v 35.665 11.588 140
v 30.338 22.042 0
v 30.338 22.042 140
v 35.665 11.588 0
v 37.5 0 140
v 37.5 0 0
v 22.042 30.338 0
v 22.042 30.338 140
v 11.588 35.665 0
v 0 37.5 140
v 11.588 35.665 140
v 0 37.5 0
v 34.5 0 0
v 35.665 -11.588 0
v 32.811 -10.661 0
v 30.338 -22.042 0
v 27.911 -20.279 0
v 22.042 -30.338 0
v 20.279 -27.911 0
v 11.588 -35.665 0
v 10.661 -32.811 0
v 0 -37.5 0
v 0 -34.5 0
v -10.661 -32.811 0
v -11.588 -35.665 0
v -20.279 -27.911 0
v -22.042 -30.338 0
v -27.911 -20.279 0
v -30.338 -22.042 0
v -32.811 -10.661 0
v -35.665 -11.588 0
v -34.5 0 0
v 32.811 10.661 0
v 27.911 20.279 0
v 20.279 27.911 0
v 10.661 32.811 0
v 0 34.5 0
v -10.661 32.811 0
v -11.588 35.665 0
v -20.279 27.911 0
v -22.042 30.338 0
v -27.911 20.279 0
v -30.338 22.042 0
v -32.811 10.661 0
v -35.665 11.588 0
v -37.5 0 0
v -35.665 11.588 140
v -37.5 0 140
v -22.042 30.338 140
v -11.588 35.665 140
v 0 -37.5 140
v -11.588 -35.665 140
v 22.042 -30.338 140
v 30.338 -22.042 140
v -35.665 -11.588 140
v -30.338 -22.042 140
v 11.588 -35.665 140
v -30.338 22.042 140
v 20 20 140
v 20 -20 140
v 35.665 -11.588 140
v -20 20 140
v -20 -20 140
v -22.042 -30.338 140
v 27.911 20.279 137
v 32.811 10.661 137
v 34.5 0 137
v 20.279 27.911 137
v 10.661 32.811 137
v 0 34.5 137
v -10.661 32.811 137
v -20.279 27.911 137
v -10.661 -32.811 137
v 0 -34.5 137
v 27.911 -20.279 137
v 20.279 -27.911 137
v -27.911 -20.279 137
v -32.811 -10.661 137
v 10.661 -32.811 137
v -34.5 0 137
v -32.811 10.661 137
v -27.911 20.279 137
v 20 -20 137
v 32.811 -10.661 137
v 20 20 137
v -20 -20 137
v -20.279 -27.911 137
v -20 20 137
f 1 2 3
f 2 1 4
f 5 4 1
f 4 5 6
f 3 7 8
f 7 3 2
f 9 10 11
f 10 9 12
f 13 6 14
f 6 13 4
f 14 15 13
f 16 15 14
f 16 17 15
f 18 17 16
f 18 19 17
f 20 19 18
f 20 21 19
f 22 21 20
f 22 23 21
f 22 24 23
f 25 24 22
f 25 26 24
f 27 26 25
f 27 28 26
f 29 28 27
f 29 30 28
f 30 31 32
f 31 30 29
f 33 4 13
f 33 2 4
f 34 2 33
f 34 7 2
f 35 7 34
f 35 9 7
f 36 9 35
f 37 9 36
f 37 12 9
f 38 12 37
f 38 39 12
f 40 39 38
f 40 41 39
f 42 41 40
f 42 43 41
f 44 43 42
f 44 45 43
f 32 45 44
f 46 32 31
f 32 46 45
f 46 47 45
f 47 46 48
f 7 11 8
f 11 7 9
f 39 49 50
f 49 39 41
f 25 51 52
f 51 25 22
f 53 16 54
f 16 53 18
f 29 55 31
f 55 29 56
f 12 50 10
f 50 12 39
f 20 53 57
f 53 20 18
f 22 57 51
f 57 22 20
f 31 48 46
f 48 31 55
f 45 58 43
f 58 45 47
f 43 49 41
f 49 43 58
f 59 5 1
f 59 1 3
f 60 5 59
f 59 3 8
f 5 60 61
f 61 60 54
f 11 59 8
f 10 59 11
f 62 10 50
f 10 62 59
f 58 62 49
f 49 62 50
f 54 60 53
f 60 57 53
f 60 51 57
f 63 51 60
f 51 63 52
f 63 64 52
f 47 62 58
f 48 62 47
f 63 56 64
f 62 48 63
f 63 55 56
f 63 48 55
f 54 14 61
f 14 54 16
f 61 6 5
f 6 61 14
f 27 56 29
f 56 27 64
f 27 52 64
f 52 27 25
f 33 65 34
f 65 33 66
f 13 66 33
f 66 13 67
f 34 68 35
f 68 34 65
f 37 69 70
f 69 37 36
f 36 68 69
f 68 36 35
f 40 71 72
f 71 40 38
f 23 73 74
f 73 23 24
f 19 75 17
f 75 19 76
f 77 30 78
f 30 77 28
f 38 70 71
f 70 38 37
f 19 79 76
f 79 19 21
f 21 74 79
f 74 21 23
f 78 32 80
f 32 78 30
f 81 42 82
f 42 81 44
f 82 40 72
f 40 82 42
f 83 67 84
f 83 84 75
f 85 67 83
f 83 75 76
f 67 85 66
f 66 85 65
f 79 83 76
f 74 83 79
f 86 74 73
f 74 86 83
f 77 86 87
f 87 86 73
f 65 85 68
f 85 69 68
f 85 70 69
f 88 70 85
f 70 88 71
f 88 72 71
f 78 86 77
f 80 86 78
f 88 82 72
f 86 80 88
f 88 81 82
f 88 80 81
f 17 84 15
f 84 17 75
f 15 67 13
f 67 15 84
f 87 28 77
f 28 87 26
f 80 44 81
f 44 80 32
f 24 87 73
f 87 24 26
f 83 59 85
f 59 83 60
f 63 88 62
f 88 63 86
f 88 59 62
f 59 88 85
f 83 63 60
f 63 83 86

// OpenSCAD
$fn = 20;
difference() {
  cylinder(140, d=75);
  cylinder(137, d=69);
  cube([40, 40, 1000], true);
}
